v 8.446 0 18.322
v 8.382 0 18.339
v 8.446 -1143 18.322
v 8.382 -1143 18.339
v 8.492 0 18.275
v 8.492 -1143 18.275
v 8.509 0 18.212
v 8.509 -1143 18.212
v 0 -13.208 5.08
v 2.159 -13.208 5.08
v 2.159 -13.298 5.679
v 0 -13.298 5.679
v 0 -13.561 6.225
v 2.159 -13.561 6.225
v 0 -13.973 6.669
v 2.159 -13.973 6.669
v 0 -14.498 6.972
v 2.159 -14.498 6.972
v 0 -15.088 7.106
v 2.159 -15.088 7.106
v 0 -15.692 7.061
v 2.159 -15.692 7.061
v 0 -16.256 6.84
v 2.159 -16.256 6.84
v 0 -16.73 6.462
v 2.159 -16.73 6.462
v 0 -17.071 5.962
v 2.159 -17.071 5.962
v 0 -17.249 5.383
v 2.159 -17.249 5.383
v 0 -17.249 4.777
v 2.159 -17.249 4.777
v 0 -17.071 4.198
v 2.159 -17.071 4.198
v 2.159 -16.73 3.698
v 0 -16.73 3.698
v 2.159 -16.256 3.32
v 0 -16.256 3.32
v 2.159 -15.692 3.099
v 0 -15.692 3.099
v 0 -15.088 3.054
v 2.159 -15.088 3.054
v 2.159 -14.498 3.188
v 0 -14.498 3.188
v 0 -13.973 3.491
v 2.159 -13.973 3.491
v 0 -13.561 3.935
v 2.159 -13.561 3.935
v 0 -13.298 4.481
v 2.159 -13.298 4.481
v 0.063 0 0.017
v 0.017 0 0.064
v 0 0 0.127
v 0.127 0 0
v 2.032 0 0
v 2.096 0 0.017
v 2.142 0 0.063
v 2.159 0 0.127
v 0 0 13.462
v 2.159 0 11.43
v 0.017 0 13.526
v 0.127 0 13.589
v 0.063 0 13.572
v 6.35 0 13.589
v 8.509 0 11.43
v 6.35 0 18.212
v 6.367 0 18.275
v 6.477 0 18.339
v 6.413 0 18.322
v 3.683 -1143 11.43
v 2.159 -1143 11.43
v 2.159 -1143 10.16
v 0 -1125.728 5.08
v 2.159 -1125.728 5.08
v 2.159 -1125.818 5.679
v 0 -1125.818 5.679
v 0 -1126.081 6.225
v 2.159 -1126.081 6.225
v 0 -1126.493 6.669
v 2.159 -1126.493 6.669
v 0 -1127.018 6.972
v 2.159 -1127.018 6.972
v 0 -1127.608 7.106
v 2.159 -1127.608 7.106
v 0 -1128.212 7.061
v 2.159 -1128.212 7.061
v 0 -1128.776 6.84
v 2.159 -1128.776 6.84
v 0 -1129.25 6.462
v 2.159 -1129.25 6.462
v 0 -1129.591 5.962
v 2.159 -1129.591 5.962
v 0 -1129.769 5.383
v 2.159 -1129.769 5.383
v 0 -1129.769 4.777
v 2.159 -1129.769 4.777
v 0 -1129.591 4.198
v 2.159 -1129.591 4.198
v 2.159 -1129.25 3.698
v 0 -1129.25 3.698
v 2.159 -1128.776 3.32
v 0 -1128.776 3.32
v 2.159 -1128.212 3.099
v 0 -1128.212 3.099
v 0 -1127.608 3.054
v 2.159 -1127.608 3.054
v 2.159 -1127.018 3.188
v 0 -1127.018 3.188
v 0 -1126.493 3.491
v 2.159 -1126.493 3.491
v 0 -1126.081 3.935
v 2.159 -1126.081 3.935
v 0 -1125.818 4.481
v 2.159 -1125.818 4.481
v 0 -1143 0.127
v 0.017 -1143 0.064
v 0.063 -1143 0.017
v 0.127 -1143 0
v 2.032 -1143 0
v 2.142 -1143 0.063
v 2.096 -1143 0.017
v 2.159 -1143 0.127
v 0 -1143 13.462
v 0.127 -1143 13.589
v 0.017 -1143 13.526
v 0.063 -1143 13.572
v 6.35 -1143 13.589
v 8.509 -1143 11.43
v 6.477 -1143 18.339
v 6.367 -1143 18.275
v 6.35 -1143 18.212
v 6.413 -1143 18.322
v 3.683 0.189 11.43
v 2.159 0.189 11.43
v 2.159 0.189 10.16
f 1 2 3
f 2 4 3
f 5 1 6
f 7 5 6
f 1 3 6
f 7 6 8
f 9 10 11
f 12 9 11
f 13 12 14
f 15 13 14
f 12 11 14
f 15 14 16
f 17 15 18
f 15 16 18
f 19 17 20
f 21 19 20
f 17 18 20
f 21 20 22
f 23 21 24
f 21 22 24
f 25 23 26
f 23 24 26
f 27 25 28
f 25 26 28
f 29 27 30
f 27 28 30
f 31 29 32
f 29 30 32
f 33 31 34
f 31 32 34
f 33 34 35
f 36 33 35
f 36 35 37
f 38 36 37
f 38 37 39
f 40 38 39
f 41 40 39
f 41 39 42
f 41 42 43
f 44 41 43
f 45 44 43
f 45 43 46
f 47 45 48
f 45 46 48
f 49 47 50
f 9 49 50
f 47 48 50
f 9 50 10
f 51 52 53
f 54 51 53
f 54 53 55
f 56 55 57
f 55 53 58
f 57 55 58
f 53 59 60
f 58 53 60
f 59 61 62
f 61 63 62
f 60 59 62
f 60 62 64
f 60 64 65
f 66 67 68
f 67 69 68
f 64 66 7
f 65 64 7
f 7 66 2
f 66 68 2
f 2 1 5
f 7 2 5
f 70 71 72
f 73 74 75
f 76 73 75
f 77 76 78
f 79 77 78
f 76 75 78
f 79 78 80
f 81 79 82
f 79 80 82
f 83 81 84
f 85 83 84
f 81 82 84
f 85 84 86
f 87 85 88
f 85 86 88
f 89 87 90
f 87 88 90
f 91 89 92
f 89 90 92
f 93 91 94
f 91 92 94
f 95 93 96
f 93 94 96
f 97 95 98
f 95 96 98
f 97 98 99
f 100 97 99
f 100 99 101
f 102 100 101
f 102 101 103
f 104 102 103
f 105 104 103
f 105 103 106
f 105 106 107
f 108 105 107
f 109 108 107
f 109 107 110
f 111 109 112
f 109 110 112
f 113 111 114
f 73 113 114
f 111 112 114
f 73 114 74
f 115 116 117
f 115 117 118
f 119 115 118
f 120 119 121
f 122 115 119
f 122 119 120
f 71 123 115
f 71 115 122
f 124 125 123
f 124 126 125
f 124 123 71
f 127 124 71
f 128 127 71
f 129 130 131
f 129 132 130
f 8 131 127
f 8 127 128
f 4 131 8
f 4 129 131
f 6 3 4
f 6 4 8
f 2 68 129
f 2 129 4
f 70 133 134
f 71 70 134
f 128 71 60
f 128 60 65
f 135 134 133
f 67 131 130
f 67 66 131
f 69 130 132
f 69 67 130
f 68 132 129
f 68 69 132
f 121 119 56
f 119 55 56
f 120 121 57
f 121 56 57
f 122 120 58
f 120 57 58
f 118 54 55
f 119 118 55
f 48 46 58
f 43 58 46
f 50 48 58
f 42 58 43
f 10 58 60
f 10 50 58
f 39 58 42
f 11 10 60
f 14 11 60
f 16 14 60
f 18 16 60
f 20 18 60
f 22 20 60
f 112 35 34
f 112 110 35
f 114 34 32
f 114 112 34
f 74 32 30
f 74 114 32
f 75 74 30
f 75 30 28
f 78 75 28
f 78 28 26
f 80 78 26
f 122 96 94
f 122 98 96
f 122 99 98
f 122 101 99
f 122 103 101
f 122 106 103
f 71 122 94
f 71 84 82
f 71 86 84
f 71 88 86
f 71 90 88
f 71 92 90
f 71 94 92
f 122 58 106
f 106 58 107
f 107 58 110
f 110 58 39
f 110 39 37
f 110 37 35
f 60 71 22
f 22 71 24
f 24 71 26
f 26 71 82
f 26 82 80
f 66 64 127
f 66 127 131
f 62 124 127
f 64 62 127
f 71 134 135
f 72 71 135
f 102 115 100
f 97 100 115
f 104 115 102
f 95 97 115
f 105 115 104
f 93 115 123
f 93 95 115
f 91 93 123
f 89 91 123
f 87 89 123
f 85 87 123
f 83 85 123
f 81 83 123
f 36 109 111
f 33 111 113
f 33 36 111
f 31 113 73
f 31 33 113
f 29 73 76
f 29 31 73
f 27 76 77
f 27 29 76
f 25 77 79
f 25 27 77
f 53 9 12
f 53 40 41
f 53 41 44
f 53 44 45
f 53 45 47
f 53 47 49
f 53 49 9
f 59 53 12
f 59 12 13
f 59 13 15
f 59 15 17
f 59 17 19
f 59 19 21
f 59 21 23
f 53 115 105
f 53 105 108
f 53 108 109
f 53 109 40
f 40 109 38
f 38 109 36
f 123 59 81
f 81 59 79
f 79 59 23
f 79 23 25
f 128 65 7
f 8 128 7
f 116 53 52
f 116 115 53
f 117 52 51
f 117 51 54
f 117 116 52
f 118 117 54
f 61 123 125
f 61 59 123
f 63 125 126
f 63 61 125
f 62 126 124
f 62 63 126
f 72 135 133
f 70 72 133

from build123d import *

# Parameters (mm, degrees)
F0_W     = 8.509
F0_H     = 18.3388
F1_DEPTH = 1143
F2_W     = 6.35
F2_H     = 4.7498
F2_H_2   = 11.43
F3_DEPTH = 1143.001
F4_R     = 0.127
F6_DEPTH = 1143.001
F7_R     = 2.032
F8_DEPTH = 2.159


# Not quite as in the source:
# - a pattern or mirror of a feature is missing from the dataset's text; its kind, count and spacing are read off the source's solid


with BuildPart() as f1:
    # F0 (on Front) → F1 (new body)
    with BuildSketch(Plane.XZ):
        with Locations((4.2545, 9.1694)):
            Rectangle(F0_W, F0_H)
    extrude(amount=F1_DEPTH)

    # F2 (on face) → F3 (cut, through all)
    with BuildSketch(Plane.XZ.offset(1143)):
        with Locations((3.175, 15.9639)):
            Rectangle(F2_W, F2_H)
        with Locations((5.334, 5.715)):
            Rectangle(F2_W, F2_H_2)
    extrude(amount=-F3_DEPTH, mode=Mode.SUBTRACT)

    # F4
    f4_edges = [f1.edges().sort_by_distance(p)[0] for p in [
        (6.35, -571.5, 18.3388),
        (8.509, -571.5, 18.3388),
        (2.159, -571.5, 0),
        (0, -571.5, 0),
        (0, -571.5, 13.589),
    ]]
    fillet(f4_edges, radius=F4_R)

    # F7 (on face) → F8 (cut, through all)
    with BuildSketch(Plane.YZ.offset(2.159)):
        with Locations((-1127.76, 5.08)):
            Circle(F7_R)
        with Locations((-15.24, 5.08)):
            Circle(F7_R)
    extrude(amount=-F8_DEPTH, mode=Mode.SUBTRACT)


with BuildPart() as f6:
    # F5 (on face) → F6 (new body, through all)
    with BuildSketch(Plane.XZ.offset(1143)):
        Polygon((2.159, 10.16), (3.683, 11.43), (2.159, 11.43), align=None)
    extrude(amount=-F6_DEPTH)

    # F6_copies: F6 across plane


with BuildPart() as f6_1:
    add(f6.part)
    add(f6.part.mirror(Plane.ZX.offset(-571.405612)))


solid = Compound([f1.part, f6_1.part])
